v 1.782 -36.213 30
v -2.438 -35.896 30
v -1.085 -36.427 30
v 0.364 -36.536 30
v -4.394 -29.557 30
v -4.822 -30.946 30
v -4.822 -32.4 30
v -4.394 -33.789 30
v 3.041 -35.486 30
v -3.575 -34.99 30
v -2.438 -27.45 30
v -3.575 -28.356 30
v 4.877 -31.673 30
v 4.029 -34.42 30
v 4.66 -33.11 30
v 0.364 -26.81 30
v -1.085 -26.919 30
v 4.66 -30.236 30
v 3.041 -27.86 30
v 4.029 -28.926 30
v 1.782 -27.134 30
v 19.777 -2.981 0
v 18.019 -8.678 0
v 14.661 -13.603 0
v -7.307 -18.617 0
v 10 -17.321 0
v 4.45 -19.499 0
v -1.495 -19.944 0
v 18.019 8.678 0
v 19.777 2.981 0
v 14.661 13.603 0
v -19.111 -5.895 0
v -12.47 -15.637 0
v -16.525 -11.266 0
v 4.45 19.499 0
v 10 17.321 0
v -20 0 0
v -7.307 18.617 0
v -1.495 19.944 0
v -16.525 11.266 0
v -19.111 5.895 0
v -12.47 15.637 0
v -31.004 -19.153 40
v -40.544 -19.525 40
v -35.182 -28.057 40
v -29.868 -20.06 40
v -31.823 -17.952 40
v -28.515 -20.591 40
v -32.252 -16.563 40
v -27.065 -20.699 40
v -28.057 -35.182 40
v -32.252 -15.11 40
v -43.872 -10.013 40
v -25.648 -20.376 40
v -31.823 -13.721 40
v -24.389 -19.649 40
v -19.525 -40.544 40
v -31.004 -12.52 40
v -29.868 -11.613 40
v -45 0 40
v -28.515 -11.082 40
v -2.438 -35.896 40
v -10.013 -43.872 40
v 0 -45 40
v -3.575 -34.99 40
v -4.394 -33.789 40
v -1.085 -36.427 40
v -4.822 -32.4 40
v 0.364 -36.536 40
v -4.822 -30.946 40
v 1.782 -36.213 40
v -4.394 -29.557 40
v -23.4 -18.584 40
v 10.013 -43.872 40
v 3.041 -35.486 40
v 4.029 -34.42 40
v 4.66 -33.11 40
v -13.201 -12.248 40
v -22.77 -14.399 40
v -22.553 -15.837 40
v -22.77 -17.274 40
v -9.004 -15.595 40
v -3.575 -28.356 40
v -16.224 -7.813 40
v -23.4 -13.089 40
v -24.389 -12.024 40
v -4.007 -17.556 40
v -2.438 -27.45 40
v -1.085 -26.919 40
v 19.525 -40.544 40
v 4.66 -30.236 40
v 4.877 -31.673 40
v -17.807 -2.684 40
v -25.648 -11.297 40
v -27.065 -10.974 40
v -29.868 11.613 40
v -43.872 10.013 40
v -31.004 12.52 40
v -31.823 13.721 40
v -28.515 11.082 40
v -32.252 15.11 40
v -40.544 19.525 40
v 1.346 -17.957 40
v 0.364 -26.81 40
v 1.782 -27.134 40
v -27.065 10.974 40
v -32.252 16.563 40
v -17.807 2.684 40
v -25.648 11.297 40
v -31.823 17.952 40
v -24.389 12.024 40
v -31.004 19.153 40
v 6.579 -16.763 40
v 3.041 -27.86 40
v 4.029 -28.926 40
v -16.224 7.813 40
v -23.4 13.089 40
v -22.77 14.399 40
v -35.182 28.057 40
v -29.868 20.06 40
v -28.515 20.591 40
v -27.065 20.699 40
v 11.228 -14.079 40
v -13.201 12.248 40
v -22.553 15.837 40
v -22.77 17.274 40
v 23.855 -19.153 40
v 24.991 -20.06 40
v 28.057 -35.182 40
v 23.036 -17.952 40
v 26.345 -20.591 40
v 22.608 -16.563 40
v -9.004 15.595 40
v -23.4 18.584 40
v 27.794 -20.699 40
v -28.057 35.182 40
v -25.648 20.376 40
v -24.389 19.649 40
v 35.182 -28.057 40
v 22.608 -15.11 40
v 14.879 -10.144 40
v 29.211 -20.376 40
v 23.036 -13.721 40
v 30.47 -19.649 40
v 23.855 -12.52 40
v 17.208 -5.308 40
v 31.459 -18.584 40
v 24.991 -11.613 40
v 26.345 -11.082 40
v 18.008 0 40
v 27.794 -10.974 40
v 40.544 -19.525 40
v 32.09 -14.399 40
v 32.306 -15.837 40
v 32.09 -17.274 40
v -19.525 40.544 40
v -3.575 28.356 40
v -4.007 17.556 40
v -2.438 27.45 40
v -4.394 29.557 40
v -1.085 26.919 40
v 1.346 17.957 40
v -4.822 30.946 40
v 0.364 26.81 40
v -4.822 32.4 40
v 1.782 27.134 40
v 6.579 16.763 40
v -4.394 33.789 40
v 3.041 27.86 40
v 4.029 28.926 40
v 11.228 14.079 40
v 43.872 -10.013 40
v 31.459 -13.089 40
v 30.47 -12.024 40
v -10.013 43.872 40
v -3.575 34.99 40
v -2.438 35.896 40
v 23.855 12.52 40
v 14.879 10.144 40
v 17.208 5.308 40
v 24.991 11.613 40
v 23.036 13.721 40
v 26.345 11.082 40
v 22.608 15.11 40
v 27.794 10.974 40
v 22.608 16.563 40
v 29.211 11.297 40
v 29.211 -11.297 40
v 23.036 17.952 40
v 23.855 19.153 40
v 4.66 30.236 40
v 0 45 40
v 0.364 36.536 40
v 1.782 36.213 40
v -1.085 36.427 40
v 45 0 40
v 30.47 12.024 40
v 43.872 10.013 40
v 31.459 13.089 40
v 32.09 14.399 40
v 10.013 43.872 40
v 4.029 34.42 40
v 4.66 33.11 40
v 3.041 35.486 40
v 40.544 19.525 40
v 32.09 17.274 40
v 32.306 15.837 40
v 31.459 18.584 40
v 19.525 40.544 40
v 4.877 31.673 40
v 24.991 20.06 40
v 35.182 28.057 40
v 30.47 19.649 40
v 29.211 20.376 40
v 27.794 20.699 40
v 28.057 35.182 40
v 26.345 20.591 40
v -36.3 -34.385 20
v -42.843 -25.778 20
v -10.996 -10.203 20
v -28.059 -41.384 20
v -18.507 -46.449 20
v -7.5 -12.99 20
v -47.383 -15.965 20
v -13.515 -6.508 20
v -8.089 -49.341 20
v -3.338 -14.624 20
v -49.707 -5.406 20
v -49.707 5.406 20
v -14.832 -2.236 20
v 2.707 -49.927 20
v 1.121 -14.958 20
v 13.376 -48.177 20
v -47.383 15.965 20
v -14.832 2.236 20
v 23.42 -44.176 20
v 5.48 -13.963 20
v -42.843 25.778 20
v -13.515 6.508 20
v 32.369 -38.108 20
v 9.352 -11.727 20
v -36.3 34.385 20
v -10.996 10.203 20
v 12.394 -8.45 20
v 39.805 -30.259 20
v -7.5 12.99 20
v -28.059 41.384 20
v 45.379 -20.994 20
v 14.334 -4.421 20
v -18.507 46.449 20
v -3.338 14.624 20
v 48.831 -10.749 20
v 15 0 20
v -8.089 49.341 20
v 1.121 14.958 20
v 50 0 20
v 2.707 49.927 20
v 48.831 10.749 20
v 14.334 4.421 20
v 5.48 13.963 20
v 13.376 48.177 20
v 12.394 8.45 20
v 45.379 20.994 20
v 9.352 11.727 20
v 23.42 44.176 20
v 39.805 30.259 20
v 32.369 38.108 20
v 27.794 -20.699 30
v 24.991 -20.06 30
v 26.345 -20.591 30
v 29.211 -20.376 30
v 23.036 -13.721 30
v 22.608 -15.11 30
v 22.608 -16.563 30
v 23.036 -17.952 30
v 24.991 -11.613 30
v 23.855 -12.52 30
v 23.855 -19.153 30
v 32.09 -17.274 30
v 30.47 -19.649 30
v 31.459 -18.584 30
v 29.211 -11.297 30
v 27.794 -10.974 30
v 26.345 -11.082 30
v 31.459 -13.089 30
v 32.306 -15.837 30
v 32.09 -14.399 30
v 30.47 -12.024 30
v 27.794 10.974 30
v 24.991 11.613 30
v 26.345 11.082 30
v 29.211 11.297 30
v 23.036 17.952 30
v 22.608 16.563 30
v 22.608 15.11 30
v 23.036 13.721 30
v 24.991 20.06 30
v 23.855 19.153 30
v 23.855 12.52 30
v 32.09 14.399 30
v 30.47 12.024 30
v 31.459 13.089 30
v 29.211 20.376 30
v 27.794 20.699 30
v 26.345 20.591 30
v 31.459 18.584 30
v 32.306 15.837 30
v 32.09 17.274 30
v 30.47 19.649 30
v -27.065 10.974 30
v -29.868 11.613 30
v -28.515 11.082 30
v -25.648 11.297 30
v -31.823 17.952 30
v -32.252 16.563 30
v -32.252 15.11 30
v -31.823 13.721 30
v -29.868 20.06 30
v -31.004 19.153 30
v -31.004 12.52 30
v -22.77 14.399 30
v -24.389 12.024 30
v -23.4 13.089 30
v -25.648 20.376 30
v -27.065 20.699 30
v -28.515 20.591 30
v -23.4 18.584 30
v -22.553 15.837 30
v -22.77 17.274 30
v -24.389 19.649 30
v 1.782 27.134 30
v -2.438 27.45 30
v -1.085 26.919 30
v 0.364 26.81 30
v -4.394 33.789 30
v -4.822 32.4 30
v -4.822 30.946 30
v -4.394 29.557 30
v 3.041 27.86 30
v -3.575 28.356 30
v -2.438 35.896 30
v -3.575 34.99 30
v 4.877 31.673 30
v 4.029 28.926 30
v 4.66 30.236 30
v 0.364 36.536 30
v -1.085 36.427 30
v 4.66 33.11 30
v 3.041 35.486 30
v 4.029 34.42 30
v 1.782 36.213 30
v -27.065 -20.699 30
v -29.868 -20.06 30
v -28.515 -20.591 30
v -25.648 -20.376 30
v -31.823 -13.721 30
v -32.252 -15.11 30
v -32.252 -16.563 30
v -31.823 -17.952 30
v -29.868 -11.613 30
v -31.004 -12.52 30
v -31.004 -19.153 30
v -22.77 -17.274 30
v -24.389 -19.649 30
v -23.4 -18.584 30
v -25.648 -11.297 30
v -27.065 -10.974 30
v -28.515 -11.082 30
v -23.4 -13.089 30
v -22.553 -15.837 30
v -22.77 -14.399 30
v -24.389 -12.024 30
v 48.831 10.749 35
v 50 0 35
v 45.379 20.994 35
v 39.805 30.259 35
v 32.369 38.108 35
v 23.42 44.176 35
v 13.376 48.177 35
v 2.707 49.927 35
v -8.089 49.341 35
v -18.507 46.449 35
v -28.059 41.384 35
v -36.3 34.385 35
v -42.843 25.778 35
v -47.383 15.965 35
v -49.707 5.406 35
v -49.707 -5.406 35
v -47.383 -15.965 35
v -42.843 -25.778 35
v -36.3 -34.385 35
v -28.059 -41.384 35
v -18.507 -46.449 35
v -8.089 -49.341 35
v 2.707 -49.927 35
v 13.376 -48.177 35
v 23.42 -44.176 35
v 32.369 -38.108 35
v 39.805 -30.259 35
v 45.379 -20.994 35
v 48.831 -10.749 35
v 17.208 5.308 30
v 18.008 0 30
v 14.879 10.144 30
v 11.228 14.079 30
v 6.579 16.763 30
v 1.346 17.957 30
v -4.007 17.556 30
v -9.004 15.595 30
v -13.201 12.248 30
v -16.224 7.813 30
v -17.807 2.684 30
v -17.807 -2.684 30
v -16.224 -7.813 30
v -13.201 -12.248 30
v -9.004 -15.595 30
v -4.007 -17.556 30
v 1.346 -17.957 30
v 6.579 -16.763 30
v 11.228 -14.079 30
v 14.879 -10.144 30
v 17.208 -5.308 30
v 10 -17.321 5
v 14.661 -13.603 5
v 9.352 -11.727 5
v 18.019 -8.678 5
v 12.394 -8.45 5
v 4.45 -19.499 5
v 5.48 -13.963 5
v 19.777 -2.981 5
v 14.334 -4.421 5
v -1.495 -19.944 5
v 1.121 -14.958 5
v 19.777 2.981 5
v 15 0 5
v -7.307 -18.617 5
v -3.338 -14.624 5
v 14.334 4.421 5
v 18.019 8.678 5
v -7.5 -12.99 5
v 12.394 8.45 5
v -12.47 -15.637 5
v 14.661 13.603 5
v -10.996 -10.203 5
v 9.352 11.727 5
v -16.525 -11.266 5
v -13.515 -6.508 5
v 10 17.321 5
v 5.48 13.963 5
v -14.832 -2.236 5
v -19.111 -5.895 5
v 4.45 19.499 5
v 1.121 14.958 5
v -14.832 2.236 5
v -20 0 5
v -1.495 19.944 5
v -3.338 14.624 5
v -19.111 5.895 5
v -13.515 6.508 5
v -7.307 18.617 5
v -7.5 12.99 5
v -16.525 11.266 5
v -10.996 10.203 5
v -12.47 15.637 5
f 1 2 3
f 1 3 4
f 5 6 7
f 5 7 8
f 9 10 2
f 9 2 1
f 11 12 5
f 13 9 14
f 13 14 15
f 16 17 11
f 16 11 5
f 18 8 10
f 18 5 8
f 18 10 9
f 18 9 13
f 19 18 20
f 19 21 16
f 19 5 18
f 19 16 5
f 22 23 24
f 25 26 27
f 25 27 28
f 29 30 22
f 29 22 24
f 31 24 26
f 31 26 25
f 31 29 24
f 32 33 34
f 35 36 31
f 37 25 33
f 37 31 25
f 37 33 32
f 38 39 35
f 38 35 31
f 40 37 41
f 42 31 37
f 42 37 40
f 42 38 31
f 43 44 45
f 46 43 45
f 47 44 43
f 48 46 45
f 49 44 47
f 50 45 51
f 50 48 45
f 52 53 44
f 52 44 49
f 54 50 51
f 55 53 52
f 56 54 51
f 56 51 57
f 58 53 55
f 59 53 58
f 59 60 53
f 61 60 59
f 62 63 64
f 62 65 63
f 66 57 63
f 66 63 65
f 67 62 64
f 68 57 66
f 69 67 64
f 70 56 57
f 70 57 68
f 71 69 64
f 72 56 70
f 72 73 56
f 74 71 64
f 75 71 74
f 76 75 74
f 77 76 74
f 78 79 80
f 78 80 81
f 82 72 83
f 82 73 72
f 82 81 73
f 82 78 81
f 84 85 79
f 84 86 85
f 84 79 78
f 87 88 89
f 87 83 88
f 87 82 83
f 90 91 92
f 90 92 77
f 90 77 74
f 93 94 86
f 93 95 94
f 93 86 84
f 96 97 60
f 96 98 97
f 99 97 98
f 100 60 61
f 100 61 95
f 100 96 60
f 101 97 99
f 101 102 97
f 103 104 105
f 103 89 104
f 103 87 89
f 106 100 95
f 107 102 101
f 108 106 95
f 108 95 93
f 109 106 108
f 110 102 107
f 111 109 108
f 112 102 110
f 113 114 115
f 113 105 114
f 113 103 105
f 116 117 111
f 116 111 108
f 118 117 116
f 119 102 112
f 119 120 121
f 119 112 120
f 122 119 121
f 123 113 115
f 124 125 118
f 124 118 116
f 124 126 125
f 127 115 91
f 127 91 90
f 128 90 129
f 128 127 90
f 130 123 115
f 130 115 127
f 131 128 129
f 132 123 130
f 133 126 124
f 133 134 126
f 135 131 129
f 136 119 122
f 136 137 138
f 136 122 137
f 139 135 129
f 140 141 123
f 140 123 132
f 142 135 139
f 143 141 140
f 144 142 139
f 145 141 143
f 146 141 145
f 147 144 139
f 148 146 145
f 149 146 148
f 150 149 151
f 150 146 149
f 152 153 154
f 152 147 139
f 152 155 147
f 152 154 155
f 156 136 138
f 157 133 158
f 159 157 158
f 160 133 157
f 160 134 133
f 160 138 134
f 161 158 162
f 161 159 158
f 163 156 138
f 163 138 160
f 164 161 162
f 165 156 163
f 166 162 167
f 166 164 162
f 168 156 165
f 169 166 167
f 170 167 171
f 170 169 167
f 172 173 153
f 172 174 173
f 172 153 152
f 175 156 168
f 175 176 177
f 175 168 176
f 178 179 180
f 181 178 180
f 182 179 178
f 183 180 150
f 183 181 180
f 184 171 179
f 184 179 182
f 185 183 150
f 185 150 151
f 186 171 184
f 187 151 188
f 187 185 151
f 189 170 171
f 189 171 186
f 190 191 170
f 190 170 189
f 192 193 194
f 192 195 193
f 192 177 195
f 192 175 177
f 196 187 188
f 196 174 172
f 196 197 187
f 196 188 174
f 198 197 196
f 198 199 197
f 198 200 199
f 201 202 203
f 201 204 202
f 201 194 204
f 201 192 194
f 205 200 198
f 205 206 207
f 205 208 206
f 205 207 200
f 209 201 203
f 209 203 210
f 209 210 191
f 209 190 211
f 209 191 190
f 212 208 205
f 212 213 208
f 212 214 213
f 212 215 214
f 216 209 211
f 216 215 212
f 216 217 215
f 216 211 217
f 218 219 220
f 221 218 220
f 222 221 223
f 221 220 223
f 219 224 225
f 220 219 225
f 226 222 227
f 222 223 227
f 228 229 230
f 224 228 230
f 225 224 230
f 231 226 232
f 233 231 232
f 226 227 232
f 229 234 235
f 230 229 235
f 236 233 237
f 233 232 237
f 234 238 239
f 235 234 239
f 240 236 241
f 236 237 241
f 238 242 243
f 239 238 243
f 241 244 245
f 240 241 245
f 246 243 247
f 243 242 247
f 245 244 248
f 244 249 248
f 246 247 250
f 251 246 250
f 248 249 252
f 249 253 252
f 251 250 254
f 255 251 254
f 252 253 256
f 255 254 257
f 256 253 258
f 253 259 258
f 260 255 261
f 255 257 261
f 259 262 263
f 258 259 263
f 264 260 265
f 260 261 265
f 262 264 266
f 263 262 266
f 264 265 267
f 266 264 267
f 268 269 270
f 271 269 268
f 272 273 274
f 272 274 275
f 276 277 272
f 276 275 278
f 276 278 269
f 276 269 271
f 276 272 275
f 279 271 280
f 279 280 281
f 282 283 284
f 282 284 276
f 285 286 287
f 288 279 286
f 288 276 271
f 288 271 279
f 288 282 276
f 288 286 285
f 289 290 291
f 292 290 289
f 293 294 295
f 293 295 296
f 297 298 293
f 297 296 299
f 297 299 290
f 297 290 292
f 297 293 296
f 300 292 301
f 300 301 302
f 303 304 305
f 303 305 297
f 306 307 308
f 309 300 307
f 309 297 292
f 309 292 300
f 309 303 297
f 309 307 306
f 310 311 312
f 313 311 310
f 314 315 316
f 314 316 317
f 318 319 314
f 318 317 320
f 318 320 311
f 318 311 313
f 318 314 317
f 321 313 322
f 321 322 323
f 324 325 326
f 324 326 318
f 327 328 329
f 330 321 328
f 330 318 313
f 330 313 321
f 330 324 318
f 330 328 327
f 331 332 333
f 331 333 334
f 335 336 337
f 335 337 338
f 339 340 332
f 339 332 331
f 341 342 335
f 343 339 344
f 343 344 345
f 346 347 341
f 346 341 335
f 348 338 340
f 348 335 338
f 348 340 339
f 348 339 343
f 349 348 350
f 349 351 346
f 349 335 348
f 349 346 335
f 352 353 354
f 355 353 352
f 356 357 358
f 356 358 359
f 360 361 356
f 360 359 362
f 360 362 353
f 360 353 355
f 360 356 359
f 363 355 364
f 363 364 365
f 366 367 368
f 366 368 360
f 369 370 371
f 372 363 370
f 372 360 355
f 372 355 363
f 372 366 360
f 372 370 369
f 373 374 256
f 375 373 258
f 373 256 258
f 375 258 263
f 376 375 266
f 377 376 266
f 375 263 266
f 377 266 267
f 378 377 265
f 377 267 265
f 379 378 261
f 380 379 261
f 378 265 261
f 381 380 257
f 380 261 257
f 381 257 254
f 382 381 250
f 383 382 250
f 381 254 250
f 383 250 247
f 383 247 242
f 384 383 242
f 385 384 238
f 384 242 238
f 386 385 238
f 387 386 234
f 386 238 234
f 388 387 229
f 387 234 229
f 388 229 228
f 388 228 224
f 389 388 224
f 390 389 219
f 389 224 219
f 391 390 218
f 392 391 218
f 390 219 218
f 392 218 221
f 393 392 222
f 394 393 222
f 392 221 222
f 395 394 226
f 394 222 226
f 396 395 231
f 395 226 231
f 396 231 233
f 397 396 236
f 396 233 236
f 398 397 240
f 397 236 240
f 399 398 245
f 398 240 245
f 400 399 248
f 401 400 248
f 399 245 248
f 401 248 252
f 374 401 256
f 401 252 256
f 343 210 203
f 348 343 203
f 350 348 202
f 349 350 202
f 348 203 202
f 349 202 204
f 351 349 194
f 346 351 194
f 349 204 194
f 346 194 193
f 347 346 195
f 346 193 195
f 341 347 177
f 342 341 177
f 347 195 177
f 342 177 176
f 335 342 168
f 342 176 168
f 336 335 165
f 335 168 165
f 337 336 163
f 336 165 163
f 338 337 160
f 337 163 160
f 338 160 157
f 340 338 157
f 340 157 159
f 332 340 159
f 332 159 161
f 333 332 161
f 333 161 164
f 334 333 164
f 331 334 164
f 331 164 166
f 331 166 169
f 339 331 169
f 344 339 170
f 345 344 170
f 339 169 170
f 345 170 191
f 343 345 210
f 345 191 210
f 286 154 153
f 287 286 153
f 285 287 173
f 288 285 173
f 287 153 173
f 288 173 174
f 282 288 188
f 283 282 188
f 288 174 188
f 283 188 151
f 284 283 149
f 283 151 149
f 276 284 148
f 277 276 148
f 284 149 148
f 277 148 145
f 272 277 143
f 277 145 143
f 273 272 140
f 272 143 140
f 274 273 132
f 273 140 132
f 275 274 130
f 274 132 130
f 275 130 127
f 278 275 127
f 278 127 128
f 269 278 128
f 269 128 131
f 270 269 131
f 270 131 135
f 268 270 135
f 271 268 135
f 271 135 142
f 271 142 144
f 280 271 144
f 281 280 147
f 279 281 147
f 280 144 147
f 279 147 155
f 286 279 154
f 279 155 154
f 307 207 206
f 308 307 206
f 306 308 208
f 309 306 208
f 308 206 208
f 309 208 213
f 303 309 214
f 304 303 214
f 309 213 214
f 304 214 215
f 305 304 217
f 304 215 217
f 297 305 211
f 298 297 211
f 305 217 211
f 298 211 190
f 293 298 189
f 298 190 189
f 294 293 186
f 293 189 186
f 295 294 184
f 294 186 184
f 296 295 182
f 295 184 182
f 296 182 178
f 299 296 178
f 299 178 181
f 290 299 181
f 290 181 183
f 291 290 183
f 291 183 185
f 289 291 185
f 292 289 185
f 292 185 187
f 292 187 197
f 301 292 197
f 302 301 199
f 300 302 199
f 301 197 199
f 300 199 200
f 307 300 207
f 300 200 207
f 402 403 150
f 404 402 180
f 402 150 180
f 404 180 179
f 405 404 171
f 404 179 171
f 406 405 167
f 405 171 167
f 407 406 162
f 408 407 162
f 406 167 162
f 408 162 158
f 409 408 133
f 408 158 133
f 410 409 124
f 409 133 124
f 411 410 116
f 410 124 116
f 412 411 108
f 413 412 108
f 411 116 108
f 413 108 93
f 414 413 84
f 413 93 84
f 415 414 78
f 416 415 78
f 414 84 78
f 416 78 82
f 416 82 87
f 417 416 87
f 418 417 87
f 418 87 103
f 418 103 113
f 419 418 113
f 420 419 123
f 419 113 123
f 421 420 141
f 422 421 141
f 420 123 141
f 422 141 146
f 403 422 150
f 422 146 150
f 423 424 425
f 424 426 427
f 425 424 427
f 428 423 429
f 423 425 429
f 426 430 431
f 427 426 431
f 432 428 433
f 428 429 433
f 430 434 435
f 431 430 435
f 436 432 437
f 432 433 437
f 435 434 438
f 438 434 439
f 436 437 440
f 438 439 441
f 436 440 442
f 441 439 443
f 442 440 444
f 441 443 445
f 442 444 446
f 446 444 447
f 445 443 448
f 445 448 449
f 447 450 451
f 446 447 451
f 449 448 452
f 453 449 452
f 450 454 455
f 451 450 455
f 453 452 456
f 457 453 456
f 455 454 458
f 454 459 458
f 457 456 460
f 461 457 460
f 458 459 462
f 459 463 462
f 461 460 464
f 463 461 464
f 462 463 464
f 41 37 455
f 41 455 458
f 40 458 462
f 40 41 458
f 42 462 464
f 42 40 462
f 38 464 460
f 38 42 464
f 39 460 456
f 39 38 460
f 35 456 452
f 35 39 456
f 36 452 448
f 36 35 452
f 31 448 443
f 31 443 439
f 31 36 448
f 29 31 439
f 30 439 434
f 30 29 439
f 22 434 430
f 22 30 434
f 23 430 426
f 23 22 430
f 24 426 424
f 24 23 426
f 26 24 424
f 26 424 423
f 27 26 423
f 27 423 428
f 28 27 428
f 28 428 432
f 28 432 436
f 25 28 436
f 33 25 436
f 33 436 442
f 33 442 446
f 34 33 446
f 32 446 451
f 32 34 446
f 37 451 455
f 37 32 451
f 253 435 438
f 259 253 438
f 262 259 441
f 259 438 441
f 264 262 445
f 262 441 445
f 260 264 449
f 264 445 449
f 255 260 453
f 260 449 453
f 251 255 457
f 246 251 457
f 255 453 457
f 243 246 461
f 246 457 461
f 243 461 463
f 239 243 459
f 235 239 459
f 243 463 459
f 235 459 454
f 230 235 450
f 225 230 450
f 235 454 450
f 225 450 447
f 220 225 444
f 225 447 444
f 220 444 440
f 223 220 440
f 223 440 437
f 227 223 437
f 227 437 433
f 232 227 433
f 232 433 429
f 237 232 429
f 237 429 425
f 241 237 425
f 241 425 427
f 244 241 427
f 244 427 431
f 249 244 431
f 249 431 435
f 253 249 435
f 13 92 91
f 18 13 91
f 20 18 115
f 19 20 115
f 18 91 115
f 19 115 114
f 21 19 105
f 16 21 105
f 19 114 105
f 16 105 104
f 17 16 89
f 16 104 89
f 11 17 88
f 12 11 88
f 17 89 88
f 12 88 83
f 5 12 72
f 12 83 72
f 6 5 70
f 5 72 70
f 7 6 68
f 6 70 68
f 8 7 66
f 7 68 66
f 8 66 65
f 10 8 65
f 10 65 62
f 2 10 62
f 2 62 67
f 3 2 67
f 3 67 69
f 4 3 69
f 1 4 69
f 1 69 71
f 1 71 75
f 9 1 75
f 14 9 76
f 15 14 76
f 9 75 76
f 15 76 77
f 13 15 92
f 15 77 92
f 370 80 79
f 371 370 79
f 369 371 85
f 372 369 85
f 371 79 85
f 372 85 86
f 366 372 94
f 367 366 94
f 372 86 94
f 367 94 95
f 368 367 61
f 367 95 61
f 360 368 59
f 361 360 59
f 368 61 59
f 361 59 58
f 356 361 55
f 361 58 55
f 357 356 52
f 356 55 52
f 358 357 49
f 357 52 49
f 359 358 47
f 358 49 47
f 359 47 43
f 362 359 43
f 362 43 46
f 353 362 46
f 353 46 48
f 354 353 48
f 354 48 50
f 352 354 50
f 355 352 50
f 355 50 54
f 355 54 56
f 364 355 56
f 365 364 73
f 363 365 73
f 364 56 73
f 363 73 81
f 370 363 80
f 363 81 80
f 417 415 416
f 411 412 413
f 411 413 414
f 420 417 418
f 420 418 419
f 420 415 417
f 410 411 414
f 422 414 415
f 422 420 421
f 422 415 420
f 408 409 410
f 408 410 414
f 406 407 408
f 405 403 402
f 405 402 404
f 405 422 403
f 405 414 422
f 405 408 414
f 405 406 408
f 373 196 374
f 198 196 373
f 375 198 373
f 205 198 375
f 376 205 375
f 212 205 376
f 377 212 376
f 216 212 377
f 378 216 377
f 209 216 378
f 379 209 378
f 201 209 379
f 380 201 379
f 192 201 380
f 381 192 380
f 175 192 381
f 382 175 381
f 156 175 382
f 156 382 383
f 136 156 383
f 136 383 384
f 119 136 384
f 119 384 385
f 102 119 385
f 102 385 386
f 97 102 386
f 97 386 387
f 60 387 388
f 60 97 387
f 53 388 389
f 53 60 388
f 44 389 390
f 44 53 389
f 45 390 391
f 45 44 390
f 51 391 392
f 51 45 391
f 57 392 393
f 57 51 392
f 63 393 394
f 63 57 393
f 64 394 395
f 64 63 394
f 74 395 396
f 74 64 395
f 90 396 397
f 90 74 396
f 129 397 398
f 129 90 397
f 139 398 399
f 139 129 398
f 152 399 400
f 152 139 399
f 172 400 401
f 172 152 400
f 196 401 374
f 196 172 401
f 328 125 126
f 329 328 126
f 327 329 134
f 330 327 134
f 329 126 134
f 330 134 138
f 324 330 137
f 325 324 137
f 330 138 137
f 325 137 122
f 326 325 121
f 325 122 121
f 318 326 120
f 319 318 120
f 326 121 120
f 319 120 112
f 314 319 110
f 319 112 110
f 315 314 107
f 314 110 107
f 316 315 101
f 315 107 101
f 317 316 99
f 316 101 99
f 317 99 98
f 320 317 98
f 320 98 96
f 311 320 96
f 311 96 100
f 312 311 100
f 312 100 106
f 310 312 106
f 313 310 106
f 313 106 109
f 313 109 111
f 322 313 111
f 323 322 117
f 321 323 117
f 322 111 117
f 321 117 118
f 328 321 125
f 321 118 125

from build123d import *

# Parameters (mm, degrees)
SKETCH1_R           = 15
BOSS_EXTRUDE1_DEPTH = 20
SKETCH3_R           = 50
BOSS_EXTRUDE2_DEPTH = 20
CHAMFER1_SIZE       = 5
SKETCH4_R           = 4.876598491
SKETCH4_R_2         = 18.007662835
CUT_EXTRUDE1_DEPTH  = 10
SKETCH5_R           = 20
BOSS_EXTRUDE3_DEPTH = 5


with BuildPart() as part:
    # Sketch1 → Boss-Extrude1 (new body)
    with BuildSketch(Plane.XY):
        Circle(SKETCH1_R)
    extrude(amount=BOSS_EXTRUDE1_DEPTH)

    # Sketch3 → Boss-Extrude2 (add)
    with BuildSketch(Plane.XY.offset(20)):
        Circle(SKETCH3_R)
    extrude(amount=BOSS_EXTRUDE2_DEPTH)

    # Chamfer1
    chamfer1_edges = [part.edges().sort_by_distance(p)[0] for p in [
        (-50, 0, 40),
    ]]
    chamfer(chamfer1_edges, length=CHAMFER1_SIZE)

    # Sketch4 → Cut-Extrude1 (cut)
    with BuildSketch(Plane.XY.offset(40)):
        with Locations((27.429667962, 15.836526181)):
            Circle(SKETCH4_R)
        Circle(SKETCH4_R_2)
        with Locations((27.429667962, -15.836526181)):
            Circle(SKETCH4_R)
        with Locations((0, -31.673052363)):
            Circle(SKETCH4_R)
        with Locations((-27.429667961, -15.836526181)):
            Circle(SKETCH4_R)
        with Locations((-27.429667961, 15.836526181)):
            Circle(SKETCH4_R)
        with Locations((0, 31.673052363)):
            Circle(SKETCH4_R)
    extrude(amount=-CUT_EXTRUDE1_DEPTH, mode=Mode.SUBTRACT)

    # Sketch5 → Boss-Extrude3 (add)
    with BuildSketch(Plane(origin=(0, 0, 0), x_dir=(-1, 0, 0), z_dir=(0, 0, -1))):
        Circle(SKETCH5_R)
    extrude(amount=-BOSS_EXTRUDE3_DEPTH)


solid = part.part
